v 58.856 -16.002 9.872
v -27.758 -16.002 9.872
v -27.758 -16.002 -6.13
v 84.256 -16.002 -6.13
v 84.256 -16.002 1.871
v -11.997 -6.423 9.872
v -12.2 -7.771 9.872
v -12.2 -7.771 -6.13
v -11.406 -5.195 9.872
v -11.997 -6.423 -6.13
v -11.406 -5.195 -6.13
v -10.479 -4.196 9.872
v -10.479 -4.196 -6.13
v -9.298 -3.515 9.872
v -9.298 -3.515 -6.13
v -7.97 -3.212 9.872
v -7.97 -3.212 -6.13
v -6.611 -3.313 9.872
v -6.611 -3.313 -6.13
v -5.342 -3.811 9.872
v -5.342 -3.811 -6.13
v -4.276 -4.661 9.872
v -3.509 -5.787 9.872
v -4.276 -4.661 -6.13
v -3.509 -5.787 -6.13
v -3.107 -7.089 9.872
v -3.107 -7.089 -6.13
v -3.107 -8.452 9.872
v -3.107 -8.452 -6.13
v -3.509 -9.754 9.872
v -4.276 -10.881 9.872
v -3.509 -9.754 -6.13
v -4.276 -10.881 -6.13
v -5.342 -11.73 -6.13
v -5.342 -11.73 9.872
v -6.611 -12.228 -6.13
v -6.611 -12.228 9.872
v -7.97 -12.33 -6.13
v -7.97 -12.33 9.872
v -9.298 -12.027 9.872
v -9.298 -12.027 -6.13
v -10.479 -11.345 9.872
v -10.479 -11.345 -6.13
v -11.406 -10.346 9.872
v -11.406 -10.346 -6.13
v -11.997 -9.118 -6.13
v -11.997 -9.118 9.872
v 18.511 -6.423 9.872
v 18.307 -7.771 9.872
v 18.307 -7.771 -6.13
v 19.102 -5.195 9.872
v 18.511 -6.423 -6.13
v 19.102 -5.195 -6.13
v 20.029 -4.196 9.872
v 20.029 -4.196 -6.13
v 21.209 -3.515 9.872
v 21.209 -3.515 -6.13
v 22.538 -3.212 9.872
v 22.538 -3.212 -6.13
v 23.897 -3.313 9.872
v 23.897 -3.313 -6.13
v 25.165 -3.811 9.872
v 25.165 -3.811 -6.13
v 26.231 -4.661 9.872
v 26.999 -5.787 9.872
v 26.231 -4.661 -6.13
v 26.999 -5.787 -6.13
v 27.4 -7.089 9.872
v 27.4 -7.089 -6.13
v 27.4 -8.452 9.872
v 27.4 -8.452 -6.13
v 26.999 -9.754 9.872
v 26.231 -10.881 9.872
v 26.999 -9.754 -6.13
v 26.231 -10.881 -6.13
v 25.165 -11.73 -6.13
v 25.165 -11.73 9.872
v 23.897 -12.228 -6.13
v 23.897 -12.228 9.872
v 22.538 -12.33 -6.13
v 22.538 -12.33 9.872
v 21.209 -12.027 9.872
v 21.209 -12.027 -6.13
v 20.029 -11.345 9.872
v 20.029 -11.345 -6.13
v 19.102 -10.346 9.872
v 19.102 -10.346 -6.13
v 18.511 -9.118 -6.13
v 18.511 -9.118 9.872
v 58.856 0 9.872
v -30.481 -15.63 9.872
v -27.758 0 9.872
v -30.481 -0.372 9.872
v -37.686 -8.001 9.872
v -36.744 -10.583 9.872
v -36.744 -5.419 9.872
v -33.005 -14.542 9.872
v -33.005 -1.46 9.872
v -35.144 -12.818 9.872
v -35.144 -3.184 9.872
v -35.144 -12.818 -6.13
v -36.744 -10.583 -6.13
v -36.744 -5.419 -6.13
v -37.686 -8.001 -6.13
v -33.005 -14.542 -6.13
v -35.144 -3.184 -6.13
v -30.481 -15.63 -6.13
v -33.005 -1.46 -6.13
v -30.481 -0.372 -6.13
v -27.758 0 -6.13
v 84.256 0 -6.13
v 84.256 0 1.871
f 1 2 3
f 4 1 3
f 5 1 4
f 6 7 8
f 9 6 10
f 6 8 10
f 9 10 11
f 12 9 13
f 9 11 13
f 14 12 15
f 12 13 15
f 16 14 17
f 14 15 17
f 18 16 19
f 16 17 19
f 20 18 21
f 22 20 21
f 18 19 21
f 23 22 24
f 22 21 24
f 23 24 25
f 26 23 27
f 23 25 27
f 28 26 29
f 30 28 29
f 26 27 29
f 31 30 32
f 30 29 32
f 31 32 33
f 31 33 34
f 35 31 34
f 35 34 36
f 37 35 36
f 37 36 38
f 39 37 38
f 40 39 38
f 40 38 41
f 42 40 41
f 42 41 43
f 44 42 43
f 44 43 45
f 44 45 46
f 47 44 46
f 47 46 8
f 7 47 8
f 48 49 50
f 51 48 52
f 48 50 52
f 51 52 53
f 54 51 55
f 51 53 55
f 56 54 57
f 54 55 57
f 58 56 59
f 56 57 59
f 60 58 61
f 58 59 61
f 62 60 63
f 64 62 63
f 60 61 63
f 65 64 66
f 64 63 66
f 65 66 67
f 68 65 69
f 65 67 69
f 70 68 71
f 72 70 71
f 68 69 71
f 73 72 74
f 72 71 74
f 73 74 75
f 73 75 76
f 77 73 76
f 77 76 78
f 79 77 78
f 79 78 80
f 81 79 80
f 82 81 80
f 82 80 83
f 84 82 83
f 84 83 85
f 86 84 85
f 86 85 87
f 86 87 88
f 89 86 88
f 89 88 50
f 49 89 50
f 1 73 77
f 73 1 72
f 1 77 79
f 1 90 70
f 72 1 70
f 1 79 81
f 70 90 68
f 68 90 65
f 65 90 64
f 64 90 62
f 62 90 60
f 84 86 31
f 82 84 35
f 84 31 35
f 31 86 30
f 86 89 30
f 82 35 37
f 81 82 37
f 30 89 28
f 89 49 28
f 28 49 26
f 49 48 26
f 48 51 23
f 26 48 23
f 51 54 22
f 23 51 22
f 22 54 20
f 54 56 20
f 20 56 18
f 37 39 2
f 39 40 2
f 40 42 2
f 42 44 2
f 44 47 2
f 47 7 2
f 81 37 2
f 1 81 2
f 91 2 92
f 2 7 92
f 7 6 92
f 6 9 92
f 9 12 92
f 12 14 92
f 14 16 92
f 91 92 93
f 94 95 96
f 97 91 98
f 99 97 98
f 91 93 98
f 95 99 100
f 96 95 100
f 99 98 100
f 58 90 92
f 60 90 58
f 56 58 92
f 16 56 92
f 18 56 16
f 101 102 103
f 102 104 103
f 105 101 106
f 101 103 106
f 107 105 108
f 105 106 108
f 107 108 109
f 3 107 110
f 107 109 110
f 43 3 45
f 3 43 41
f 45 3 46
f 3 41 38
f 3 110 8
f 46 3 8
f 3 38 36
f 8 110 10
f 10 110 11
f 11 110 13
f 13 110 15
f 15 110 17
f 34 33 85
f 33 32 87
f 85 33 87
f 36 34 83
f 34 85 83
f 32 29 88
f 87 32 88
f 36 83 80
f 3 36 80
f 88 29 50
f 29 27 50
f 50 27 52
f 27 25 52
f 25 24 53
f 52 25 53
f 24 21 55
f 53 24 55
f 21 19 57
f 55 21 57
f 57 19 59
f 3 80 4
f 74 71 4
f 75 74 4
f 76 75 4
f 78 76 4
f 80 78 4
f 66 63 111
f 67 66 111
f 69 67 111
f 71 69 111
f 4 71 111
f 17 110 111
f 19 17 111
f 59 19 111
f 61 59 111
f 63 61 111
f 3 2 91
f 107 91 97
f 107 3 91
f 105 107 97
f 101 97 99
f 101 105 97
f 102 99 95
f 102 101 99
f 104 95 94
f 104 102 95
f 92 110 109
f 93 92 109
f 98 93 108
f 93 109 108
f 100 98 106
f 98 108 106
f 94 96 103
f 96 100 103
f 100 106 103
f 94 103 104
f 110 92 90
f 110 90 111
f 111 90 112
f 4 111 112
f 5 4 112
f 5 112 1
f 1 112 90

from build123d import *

# Parameters (mm, degrees)
F1_DEPTH    = 16.002
F3_D        = 9.144
F4_T1_DEPTH = 66.802


# Not quite as in the source:
# - a fillet or chamfer that OpenCascade refuses, or shapes differently, is made with other operations: its cross-section is extruded or revolved along the edge and cut away or added


with BuildPart() as f1:
    # F0 (on Front) → F1 (new body)
    with BuildSketch(Plane.XZ):
        Polygon((58.8562823832, 9.8717374111), (-37.9177176168, 9.8717374111), (-37.9177176168, -6.1302625889), (84.2562823832, -6.1302625889), (84.2562823832, 1.8707374111), align=None)
    extrude(amount=F1_DEPTH)

    # F3 (through all)
    with Locations(Plane.XY.offset(9.8717374111)):
        with Locations((-7.6279942878, -7.7707557939), (22.8794198483, -7.7707557939)):
            Hole(F3_D / 2)

    # F4: fillet of radius 10.16 on 2 edges, made by hand

    # F4_s2 → F4_t1 (cut)
    with BuildSketch(Plane.XY.offset(-31.5302625889)):
        with BuildLine():
            ThreePointArc((-27.7577176168, -16.002), (-34.9419225137, -13.0262048969), (-37.9177176168, -5.842))
            Line((-37.9177176168, -5.842), (-37.9177176168, -16.002))
            Line((-37.9177176168, -16.002), (-27.7577176168, -16.002))
        make_face()
        with BuildLine():
            ThreePointArc((-27.7577176168, 0), (-34.9419225137, -2.9757951031), (-37.9177176168, -10.16))
            Line((-37.9177176168, -10.16), (-37.9177176168, 0))
            Line((-37.9177176168, 0), (-27.7577176168, 0))
        make_face()
    extrude(amount=F4_T1_DEPTH, mode=Mode.SUBTRACT)


solid = f1.part
